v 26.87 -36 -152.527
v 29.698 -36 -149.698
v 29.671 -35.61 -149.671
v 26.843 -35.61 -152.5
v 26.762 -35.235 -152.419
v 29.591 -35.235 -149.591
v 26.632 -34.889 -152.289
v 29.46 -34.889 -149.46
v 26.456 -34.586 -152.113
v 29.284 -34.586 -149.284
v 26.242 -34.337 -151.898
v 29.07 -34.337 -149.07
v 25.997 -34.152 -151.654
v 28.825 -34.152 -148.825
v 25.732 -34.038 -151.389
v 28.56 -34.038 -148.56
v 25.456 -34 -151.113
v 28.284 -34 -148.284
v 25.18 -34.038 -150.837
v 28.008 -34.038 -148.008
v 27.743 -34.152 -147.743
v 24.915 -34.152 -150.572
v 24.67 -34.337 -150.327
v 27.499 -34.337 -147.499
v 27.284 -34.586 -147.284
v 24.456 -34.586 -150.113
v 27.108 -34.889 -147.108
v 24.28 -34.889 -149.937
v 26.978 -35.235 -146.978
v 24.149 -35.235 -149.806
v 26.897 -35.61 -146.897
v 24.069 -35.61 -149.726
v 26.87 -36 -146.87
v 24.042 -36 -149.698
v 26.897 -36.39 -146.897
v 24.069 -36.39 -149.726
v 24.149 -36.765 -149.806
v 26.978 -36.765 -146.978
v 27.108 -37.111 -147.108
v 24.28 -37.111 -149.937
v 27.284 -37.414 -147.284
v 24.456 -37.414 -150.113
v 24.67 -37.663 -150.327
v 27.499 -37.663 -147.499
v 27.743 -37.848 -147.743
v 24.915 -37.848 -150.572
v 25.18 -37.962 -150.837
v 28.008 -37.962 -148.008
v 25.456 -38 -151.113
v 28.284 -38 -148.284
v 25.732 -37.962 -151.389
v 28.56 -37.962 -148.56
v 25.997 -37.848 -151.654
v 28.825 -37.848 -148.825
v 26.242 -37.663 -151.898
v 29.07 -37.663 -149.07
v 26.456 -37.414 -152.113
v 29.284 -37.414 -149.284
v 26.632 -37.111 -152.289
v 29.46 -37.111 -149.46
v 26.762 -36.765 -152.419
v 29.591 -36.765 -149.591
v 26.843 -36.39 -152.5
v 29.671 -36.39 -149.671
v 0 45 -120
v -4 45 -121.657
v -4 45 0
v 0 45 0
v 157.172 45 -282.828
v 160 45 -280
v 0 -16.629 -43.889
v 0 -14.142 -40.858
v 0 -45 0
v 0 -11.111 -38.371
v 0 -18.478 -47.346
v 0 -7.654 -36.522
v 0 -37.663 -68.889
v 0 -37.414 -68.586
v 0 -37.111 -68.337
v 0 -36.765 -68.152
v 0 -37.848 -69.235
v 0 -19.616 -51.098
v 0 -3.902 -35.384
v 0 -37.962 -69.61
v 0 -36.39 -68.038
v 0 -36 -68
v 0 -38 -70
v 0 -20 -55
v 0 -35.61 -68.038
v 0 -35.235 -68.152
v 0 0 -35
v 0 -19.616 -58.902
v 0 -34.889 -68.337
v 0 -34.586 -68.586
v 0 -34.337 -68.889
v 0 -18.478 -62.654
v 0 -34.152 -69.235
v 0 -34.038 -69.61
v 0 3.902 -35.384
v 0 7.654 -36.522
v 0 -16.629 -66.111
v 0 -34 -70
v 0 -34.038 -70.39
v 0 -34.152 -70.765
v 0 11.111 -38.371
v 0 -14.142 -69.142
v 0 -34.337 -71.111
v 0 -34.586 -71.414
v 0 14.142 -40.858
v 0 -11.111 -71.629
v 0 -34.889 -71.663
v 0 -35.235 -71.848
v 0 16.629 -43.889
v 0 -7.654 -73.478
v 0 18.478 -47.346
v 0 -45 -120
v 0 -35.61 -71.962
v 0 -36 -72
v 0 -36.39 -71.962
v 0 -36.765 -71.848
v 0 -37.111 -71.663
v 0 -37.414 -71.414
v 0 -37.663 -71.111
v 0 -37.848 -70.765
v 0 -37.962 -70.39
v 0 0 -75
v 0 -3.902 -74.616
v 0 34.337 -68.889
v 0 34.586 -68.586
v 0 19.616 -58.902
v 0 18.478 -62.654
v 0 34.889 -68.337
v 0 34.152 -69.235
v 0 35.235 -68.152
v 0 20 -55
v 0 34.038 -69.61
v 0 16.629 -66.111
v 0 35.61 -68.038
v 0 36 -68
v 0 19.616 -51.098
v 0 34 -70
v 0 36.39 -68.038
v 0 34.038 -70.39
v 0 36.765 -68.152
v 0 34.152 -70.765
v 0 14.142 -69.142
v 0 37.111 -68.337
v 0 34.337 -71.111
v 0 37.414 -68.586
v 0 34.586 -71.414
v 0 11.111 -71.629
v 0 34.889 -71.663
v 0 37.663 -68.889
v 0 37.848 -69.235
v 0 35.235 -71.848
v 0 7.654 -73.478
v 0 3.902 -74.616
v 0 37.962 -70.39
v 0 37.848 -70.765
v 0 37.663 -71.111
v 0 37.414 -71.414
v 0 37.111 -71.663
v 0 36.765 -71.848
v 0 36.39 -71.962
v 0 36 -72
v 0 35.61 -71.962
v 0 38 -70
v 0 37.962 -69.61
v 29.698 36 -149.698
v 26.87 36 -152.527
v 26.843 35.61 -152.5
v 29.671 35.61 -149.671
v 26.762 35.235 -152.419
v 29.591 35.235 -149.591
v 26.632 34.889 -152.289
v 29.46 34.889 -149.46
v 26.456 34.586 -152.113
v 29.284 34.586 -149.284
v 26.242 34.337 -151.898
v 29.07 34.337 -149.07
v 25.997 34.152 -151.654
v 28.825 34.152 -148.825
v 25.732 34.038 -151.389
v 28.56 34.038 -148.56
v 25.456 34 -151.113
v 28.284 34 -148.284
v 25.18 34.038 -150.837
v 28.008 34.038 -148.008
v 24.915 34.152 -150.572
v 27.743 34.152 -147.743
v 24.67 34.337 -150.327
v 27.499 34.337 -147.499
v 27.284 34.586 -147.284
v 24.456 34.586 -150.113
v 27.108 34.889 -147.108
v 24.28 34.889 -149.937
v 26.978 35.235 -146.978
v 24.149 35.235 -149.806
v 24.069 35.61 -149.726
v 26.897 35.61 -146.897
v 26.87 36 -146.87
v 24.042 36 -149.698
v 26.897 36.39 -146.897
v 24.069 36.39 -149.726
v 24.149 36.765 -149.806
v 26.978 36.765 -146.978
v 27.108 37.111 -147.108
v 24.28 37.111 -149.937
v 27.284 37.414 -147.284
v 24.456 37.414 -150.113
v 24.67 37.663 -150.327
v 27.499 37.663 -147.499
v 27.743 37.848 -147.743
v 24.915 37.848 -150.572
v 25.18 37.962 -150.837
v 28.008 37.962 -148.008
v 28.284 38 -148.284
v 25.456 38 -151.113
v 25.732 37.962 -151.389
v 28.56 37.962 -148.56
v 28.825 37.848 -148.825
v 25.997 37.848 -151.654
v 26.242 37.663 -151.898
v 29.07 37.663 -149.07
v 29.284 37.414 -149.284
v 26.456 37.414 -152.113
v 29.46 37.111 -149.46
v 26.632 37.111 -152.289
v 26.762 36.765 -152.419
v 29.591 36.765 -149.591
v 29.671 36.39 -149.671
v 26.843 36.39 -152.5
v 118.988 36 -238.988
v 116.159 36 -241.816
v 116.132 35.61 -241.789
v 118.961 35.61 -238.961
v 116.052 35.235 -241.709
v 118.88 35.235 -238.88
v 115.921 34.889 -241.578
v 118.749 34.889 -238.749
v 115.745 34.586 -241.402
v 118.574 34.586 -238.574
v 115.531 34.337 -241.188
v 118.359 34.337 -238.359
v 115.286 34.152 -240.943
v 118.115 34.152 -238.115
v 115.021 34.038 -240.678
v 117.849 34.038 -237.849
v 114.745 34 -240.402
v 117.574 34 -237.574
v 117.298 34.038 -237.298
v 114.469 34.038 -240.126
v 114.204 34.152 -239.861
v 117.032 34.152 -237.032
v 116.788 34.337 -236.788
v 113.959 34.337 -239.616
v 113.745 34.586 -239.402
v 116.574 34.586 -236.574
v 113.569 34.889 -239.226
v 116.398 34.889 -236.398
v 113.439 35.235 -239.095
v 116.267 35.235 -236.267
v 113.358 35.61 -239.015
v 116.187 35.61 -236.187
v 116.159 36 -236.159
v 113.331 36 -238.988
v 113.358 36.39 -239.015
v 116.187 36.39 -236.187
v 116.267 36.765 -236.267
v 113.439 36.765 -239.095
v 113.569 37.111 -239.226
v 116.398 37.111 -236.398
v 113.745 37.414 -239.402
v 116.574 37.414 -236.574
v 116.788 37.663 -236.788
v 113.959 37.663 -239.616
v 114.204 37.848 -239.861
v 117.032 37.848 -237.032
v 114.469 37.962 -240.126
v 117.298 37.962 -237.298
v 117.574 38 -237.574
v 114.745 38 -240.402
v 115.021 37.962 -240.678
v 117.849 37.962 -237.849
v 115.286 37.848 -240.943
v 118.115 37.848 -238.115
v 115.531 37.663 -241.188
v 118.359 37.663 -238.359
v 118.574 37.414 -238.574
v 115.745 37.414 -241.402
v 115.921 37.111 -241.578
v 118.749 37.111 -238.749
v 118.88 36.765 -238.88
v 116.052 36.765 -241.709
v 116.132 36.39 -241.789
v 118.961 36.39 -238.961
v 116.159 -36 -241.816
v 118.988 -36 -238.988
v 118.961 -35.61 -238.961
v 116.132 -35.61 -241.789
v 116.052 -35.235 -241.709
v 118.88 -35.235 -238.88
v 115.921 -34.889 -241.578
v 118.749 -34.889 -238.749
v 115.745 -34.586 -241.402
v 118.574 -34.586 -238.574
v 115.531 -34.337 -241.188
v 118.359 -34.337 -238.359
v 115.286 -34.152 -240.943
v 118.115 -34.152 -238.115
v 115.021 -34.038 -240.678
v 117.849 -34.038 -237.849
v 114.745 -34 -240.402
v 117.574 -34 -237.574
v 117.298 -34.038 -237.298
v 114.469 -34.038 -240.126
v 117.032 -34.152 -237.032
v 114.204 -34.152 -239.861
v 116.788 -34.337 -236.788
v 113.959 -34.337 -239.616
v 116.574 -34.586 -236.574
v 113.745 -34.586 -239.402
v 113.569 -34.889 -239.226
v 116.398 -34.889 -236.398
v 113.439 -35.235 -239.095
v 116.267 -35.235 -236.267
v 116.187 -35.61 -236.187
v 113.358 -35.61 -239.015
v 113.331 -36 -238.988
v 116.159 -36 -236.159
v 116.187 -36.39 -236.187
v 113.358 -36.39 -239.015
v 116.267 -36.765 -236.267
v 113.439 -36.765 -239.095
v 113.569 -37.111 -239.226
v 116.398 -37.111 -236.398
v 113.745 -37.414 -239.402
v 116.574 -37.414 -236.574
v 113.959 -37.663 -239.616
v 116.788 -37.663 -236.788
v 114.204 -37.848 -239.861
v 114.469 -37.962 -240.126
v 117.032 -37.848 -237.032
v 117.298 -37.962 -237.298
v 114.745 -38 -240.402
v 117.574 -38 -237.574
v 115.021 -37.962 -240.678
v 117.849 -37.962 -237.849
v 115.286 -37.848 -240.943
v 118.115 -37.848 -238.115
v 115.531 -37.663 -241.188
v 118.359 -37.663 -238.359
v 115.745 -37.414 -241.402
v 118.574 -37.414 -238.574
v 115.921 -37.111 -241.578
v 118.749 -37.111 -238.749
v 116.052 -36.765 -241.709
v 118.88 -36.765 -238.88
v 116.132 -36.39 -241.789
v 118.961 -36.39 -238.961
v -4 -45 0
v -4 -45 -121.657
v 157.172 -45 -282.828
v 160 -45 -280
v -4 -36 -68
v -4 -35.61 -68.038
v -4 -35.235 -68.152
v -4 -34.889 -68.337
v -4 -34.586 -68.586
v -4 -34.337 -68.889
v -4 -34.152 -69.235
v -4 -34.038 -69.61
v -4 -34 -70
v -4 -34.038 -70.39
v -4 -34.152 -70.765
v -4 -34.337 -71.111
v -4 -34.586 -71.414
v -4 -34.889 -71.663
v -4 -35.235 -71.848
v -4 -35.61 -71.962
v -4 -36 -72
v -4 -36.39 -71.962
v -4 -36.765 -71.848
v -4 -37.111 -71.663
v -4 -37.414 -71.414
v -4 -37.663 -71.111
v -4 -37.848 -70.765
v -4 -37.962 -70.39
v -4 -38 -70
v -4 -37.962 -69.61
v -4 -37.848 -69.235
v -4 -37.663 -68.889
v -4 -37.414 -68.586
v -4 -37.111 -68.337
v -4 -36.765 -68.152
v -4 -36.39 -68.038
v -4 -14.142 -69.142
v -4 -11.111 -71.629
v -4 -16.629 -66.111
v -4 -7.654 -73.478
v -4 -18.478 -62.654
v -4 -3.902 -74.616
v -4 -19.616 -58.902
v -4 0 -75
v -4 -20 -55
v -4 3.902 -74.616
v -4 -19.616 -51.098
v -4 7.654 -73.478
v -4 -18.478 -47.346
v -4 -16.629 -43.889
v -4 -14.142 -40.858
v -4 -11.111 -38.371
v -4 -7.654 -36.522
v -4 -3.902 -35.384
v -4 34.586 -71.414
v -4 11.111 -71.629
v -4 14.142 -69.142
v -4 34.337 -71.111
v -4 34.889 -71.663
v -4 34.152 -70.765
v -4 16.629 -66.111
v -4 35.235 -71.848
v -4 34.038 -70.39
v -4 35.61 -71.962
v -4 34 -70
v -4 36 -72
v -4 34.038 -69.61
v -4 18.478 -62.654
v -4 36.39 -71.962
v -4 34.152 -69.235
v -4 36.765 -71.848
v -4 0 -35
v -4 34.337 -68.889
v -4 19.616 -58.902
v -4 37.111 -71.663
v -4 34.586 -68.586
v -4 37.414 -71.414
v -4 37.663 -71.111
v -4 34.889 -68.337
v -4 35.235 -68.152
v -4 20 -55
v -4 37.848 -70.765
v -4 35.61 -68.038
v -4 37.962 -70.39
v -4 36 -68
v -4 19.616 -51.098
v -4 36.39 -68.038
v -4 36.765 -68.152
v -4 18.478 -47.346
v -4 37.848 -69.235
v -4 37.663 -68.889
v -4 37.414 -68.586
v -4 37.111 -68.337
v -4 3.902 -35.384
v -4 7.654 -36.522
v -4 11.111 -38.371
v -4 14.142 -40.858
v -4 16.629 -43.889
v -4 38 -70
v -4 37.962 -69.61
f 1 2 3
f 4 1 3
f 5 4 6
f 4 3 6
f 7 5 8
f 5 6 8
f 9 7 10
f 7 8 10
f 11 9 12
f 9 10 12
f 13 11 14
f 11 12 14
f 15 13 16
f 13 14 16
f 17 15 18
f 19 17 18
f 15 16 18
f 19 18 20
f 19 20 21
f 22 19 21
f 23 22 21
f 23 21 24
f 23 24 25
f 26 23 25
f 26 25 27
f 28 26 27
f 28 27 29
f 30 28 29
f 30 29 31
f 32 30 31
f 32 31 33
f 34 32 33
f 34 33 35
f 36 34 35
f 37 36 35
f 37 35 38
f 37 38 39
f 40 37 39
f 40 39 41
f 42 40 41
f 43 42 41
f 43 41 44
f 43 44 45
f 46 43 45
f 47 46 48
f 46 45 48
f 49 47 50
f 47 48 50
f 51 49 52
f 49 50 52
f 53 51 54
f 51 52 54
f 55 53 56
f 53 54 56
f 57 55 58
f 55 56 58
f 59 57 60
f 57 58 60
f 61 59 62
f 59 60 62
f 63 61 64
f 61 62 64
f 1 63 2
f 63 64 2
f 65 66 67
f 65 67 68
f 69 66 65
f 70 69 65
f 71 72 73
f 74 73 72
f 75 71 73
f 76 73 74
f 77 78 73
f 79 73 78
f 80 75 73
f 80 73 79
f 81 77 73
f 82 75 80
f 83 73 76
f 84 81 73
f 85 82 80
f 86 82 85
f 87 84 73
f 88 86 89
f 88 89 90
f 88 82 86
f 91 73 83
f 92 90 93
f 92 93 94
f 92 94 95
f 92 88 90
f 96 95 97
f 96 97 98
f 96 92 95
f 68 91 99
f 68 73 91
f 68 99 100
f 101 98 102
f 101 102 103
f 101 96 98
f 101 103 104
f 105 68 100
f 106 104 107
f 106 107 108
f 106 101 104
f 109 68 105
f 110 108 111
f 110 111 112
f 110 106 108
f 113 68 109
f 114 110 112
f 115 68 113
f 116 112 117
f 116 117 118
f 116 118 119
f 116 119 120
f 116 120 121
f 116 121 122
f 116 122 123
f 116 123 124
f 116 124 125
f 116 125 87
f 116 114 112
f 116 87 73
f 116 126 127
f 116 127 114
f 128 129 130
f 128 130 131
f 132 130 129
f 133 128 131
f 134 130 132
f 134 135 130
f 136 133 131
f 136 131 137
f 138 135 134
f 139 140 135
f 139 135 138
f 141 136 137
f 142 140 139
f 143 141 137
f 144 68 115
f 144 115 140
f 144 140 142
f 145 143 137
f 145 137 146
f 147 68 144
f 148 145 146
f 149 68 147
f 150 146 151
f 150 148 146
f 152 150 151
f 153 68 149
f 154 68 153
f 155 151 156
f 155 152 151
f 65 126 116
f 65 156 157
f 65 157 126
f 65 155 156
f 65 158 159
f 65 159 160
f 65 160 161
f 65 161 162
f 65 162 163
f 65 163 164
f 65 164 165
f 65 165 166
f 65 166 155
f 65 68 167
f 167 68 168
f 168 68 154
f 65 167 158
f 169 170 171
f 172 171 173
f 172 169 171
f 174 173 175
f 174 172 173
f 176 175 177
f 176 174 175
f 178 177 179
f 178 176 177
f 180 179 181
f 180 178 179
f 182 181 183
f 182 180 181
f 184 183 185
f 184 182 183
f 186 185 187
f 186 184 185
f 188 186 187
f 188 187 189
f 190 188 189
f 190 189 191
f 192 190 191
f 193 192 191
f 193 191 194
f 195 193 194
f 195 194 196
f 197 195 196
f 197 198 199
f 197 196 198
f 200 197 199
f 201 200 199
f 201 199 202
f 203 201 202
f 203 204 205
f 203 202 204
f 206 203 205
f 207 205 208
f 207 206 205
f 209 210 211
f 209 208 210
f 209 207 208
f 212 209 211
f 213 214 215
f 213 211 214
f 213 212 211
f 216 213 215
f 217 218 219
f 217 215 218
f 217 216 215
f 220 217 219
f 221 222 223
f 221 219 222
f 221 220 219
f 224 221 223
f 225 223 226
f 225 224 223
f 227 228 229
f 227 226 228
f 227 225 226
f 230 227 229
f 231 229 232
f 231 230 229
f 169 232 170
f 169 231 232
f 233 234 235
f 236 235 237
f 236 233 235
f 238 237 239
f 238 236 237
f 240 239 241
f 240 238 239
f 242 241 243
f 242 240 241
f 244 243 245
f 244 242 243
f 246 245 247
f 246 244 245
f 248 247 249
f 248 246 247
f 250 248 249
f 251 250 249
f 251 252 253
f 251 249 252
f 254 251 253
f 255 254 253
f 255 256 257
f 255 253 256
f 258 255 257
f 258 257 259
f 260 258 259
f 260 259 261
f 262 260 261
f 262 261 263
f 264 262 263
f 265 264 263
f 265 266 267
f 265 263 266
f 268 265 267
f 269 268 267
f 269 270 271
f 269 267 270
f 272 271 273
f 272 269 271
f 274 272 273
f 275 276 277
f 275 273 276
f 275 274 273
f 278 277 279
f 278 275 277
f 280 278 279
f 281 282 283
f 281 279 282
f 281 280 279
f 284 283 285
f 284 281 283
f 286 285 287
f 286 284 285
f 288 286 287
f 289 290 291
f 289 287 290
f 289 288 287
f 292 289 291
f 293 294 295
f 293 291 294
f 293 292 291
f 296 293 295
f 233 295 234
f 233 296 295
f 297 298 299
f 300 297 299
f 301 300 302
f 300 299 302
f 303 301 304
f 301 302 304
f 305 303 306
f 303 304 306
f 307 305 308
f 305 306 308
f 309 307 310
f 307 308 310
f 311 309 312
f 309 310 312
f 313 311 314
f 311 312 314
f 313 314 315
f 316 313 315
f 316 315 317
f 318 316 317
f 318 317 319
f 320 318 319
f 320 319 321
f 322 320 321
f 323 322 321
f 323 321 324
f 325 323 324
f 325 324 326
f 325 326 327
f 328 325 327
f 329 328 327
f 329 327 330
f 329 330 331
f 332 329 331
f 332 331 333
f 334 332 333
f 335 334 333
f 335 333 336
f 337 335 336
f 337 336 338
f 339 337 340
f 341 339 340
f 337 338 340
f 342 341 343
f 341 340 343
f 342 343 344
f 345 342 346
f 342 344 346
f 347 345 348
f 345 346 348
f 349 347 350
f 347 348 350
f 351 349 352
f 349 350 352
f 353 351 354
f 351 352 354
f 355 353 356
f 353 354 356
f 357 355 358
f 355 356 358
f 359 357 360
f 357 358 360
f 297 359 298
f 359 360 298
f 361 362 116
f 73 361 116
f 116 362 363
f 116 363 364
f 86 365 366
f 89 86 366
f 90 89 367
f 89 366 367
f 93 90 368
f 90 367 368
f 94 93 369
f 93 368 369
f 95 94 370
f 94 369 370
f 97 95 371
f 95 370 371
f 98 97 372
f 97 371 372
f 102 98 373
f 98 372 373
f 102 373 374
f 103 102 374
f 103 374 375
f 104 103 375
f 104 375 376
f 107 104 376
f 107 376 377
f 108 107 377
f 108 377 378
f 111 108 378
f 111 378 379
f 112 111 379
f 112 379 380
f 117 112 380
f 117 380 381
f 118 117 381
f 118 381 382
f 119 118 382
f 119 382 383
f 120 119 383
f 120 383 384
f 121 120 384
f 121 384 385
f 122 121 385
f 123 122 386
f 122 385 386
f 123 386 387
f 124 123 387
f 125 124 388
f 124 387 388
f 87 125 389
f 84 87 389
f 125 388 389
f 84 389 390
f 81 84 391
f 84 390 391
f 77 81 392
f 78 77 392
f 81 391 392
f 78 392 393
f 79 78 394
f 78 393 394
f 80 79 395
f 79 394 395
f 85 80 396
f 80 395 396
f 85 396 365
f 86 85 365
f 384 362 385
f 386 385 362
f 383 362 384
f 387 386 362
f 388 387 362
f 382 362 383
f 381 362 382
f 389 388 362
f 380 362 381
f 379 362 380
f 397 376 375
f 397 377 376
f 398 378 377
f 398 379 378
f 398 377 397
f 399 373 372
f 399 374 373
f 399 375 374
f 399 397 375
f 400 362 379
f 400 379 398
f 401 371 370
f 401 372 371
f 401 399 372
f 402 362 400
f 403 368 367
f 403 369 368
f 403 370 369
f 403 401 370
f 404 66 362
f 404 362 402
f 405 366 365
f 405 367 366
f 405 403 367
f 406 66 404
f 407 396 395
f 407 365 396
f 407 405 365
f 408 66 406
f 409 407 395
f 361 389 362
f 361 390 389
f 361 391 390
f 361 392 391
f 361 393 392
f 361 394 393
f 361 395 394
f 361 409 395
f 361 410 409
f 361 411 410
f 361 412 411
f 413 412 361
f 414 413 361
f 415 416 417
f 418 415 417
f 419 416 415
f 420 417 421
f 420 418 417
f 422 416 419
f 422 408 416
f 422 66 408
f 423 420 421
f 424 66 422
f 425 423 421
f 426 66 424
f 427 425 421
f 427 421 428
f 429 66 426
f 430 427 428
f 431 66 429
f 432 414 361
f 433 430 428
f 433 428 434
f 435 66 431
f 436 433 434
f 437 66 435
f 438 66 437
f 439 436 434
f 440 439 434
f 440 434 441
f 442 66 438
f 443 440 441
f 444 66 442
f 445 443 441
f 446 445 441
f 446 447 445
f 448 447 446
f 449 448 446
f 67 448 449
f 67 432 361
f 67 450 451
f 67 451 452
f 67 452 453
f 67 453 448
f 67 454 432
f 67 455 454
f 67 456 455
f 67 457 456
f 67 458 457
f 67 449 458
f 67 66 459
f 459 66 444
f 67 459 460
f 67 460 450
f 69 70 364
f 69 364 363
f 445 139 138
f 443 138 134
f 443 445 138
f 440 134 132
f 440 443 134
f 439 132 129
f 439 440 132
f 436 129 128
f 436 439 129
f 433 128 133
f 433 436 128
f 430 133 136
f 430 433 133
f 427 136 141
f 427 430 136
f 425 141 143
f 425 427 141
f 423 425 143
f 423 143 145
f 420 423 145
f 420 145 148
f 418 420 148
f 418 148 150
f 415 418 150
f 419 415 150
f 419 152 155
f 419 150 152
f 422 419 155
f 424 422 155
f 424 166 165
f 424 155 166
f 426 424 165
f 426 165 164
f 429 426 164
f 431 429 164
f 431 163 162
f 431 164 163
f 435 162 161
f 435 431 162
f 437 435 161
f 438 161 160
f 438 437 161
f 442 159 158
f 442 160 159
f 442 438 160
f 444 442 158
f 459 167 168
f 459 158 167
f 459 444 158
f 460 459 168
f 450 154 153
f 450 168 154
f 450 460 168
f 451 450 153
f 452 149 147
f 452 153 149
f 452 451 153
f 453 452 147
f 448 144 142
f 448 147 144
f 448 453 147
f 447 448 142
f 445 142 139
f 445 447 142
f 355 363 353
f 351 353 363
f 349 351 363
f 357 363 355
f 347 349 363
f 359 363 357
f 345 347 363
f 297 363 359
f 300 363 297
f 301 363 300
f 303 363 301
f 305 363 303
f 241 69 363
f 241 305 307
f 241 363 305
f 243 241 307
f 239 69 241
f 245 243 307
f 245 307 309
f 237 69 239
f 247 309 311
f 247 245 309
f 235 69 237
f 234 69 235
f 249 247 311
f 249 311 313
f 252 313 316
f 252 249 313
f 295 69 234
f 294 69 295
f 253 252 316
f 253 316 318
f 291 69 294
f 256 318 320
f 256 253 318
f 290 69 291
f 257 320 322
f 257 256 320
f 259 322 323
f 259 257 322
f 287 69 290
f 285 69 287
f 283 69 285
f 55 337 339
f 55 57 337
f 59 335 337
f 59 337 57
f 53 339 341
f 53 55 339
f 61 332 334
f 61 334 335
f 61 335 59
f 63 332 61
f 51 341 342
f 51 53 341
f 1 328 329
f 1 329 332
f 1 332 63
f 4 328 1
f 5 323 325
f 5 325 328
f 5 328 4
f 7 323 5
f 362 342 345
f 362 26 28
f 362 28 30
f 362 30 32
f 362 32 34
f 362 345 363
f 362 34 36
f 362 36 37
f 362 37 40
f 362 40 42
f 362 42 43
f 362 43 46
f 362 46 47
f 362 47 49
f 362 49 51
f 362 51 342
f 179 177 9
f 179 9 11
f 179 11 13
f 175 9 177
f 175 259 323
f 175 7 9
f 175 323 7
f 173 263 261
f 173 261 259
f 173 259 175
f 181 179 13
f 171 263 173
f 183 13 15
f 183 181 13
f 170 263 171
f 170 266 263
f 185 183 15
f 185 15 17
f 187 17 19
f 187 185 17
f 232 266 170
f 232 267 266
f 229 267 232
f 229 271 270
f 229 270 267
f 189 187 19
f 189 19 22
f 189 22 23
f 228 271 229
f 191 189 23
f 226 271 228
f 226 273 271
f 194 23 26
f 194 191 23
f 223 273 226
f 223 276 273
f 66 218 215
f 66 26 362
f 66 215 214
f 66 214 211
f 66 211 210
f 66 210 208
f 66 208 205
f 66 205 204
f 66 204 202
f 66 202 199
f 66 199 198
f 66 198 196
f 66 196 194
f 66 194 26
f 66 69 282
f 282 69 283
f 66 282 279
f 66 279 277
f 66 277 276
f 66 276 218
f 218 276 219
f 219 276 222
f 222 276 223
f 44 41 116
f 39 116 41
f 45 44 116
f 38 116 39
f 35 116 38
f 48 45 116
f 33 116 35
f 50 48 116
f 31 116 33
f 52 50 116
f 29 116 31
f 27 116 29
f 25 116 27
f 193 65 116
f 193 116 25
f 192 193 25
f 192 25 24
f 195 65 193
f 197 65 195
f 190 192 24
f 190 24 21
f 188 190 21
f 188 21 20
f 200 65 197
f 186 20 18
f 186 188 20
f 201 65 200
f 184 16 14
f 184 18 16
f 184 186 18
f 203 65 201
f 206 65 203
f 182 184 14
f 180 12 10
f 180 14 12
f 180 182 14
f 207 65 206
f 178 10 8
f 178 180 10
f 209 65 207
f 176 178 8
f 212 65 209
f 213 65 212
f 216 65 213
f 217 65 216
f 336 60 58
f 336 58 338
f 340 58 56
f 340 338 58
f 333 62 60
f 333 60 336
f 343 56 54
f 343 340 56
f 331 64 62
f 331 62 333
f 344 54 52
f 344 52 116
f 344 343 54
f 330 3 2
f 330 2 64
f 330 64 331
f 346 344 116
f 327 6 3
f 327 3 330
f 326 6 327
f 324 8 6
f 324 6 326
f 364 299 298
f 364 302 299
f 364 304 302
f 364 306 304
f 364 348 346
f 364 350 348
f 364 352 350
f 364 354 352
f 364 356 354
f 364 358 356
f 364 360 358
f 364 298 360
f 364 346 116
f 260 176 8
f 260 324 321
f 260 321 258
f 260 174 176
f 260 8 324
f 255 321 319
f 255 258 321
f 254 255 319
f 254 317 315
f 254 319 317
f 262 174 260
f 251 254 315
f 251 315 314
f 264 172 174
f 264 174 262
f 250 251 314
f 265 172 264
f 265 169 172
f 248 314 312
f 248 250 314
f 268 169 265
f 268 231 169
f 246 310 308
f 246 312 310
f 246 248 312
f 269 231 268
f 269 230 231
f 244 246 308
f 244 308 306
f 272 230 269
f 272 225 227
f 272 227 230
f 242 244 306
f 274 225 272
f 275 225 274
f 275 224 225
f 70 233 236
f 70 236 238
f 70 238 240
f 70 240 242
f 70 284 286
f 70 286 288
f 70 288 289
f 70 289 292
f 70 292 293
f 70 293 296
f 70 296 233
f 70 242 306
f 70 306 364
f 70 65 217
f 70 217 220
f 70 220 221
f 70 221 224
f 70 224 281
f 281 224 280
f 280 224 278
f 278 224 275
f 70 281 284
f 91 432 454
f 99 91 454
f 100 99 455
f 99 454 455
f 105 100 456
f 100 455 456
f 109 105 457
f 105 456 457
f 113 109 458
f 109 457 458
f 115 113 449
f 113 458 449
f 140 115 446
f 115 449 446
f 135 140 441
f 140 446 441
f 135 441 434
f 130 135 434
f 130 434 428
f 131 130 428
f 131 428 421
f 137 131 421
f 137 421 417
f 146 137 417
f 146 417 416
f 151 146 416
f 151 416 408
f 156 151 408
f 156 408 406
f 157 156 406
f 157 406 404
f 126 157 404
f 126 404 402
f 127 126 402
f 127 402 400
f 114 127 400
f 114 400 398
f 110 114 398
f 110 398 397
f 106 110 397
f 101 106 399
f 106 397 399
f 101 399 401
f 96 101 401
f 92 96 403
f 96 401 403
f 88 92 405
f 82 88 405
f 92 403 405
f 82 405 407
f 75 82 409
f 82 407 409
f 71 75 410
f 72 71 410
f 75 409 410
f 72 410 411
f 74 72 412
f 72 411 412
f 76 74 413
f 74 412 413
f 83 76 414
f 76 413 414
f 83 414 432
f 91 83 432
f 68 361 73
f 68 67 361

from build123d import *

# Parameters (mm, degrees)
EXTRUDE_1_DEPTH     = 45
SKETCH_3_R          = 2
CUT_EXTRUDE_2_DEPTH = 90
SKETCH_4_R          = 2
CUT_EXTRUDE_3_DEPTH = 90
SKETCH_5_R          = 20
CUT_EXTRUDE_4_DEPTH = 90


with BuildPart() as part:
    # 草图1 → 凸台-拉伸1 (new, symmetric)
    with BuildSketch(Plane(origin=(0, 0, 0), x_dir=(1, 0, 0), z_dir=(0, 1, 0))):
        Polygon((0, 0), (0, 120), (160, 280), (157.171572875, 282.828427125), (-4, 121.656854249), (-4, 0), align=None)
    extrude(amount=EXTRUDE_1_DEPTH, both=True)

    # 草图3 → 切除-拉伸2 (cut)
    with BuildSketch(Plane.ZY.offset(4)):
        with Locations((-70, -36)):
            Circle(SKETCH_3_R)
    cut_extrude_2 = extrude(amount=-CUT_EXTRUDE_2_DEPTH, mode=Mode.SUBTRACT)

    # 草图4 → 切除-拉伸3 (cut)
    with BuildSketch(Plane(origin=(-60, 0, -60), x_dir=(0.7071067811865487, 0, -0.7071067811865465), z_dir=(0.7071067811865465, 0, 0.7071067811865487))):
        with Locations((124.852813742, -36)):
            Circle(SKETCH_4_R)
        with Locations((251.126983722, -36)):
            Circle(SKETCH_4_R)
    cut_extrude_3 = extrude(amount=-CUT_EXTRUDE_3_DEPTH, mode=Mode.SUBTRACT)

    # 镜向1: 切除-拉伸2, 切除-拉伸3 across plane
    add(cut_extrude_2.mirror(Plane.ZX), mode=Mode.SUBTRACT)
    add(cut_extrude_3.mirror(Plane.ZX), mode=Mode.SUBTRACT)

    # 草图5 → 切除-拉伸4 (cut)
    with BuildSketch(Plane.ZY.offset(4)):
        with Locations((-55, 0)):
            Circle(SKETCH_5_R)
    extrude(amount=-CUT_EXTRUDE_4_DEPTH, mode=Mode.SUBTRACT)


solid = part.part
